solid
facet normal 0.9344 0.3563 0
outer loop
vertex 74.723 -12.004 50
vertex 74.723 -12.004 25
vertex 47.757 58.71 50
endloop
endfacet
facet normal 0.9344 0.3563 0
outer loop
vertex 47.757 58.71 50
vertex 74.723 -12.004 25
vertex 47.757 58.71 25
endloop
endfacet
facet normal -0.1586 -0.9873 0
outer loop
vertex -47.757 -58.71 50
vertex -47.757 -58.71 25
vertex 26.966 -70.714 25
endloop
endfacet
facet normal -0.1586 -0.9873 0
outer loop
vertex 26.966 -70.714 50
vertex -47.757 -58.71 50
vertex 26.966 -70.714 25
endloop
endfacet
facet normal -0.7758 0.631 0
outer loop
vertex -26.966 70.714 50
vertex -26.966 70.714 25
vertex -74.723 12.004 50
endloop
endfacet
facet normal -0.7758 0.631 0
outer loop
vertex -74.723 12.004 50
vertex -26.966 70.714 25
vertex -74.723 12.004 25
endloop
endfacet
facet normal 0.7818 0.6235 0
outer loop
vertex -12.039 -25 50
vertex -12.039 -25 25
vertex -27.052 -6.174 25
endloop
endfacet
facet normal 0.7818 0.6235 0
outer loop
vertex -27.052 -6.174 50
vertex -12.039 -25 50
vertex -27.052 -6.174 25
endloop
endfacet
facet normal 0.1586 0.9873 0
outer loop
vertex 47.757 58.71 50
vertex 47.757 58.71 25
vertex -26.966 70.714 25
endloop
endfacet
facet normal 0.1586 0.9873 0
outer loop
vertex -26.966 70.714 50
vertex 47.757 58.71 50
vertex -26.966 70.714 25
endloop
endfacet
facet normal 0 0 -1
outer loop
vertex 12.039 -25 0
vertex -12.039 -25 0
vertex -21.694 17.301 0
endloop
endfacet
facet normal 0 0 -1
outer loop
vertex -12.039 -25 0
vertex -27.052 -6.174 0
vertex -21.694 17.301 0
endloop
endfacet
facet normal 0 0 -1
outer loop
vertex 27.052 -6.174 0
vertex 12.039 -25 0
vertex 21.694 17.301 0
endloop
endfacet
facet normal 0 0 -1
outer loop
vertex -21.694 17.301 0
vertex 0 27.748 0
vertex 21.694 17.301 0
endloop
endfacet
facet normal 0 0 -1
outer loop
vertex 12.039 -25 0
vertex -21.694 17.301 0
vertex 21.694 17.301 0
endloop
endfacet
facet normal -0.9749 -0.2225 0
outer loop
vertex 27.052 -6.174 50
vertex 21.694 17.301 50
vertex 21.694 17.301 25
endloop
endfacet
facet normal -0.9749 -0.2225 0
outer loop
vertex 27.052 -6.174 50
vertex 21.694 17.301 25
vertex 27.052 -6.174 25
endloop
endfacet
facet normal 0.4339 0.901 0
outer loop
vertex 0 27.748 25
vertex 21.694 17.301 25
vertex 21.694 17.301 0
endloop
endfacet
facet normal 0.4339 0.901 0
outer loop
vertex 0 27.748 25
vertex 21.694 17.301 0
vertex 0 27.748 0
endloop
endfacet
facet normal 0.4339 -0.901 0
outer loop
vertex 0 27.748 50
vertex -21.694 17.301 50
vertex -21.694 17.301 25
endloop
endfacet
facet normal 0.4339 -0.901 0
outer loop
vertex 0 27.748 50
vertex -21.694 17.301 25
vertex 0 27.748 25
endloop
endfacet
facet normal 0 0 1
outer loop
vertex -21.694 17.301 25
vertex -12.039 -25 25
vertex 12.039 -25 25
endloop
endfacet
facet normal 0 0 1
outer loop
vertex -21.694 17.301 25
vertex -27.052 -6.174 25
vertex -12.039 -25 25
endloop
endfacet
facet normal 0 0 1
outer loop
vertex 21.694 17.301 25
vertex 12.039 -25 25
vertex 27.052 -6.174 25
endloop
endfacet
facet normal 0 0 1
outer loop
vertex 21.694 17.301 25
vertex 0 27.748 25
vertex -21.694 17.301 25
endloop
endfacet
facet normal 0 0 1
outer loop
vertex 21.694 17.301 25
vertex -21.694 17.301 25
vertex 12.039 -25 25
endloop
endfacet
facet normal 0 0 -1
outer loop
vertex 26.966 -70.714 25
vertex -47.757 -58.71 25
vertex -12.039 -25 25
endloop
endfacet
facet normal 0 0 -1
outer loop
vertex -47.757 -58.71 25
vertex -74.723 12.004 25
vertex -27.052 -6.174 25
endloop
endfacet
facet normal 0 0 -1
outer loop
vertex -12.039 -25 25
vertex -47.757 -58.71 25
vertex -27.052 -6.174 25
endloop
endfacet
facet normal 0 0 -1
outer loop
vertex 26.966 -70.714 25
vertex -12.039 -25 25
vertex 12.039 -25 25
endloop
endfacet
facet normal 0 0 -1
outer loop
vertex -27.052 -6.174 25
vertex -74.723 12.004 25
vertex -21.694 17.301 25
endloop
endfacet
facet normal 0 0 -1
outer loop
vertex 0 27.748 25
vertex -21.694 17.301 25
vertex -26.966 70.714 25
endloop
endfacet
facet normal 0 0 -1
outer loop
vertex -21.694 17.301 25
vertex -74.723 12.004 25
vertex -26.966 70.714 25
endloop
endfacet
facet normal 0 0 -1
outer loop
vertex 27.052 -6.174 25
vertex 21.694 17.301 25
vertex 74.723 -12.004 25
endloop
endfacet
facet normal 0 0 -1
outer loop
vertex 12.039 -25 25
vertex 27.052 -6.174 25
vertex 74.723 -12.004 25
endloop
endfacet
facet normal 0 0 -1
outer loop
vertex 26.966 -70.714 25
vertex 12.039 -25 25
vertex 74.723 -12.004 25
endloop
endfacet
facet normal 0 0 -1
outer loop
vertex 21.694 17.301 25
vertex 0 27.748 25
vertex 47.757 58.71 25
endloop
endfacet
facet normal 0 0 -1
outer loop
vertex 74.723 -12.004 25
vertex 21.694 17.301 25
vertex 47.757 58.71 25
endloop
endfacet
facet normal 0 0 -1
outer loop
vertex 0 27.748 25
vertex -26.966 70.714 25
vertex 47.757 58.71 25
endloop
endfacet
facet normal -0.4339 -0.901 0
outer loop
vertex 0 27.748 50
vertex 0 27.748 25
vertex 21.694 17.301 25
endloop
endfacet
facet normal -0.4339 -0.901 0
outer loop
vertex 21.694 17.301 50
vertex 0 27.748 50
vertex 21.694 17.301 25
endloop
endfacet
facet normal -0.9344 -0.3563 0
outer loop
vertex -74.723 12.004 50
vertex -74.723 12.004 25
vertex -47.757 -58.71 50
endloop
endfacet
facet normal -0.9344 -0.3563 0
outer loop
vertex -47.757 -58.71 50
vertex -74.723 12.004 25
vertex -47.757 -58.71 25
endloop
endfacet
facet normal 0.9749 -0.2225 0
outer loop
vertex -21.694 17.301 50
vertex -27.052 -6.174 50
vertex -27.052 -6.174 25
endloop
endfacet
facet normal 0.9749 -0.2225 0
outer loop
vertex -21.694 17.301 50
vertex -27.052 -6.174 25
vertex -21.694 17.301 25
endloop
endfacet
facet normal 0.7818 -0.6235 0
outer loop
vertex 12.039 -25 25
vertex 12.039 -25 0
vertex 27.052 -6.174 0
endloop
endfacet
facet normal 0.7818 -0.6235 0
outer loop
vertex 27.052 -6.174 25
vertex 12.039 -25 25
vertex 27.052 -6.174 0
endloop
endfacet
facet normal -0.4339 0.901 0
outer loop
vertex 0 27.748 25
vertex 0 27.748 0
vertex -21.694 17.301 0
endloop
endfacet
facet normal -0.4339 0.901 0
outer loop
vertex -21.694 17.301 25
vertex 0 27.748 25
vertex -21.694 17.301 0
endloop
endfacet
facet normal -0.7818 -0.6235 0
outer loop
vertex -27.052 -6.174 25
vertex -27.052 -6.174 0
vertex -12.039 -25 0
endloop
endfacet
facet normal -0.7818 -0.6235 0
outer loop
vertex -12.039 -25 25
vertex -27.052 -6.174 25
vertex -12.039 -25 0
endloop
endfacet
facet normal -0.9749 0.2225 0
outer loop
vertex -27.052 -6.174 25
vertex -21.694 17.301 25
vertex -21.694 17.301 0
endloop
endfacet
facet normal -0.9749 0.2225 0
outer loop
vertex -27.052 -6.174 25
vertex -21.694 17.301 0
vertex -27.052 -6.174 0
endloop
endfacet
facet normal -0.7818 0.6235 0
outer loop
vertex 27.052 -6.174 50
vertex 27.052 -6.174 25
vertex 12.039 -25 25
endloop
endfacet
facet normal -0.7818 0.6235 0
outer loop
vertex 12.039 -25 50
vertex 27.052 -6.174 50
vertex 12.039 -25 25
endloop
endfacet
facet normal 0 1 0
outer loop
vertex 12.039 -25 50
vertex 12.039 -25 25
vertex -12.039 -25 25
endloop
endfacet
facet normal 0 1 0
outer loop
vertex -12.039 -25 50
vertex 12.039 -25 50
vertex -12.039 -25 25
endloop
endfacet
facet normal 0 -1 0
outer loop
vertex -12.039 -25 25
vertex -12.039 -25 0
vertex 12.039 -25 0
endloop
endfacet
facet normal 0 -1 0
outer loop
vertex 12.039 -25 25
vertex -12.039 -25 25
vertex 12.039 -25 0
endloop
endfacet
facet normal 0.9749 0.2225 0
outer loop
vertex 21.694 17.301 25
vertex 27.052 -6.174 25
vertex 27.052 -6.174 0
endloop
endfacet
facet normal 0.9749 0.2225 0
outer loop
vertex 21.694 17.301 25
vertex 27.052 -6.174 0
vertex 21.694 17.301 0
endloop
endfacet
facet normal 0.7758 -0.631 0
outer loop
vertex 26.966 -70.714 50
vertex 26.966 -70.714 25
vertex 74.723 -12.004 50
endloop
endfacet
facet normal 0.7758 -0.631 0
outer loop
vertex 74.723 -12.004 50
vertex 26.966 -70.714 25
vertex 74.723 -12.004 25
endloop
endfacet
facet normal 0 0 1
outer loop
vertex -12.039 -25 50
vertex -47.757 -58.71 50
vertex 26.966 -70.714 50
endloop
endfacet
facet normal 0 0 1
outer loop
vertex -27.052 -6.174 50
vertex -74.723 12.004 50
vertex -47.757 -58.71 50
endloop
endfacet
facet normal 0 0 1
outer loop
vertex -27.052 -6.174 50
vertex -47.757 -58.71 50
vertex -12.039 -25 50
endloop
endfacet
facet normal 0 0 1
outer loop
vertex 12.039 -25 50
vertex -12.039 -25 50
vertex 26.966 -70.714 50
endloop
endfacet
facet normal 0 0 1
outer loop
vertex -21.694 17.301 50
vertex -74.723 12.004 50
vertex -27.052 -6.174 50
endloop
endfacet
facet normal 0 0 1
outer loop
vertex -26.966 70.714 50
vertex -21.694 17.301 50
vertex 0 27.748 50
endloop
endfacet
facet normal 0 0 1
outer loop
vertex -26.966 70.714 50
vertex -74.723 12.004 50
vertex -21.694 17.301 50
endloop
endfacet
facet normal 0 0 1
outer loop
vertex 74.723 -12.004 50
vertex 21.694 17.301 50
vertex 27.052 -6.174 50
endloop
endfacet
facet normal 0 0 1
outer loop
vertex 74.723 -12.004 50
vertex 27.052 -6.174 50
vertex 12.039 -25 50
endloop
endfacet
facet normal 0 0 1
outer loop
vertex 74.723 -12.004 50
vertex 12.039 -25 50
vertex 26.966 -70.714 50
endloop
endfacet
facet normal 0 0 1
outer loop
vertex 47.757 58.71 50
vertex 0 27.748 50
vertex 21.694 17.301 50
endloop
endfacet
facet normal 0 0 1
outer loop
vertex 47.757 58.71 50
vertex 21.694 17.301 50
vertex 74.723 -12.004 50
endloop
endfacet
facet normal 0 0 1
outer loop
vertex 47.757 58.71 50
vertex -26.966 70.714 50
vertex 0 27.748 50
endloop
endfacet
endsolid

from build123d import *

# Parameters (mm, degrees)
F1_DEPTH = 25
F3_DEPTH = 25


with BuildPart() as f1:
    # F0 (on Top) → F1 (new body)
    with BuildSketch(Plane.XY):
        Polygon((-12.039365, -25), (12.039365, -25), (27.052209, -6.17449), (21.694187, 17.300537), (0, 27.747907), (-21.694187, 17.300537), (-27.052209, -6.17449), align=None)
    extrude(amount=F1_DEPTH)


with BuildPart() as f3:
    # F2 (on face) → F3 (new body)
    with BuildSketch(Plane.XY.offset(25)):
        Polygon((-26.966038, 70.713825), (-74.722988, 12.003638), (-47.75695, -58.710186), (26.966038, -70.713825), (74.722988, -12.003638), (47.75695, 58.710186), align=None)
        Polygon((-12.039365, -25), (-27.052209, -6.17449), (-21.694187, 17.300537), (0, 27.747907), (21.694187, 17.300537), (27.052209, -6.17449), (12.039365, -25), align=None, mode=Mode.SUBTRACT)
    extrude(amount=F3_DEPTH)


solid = Compound([f1.part, f3.part])
